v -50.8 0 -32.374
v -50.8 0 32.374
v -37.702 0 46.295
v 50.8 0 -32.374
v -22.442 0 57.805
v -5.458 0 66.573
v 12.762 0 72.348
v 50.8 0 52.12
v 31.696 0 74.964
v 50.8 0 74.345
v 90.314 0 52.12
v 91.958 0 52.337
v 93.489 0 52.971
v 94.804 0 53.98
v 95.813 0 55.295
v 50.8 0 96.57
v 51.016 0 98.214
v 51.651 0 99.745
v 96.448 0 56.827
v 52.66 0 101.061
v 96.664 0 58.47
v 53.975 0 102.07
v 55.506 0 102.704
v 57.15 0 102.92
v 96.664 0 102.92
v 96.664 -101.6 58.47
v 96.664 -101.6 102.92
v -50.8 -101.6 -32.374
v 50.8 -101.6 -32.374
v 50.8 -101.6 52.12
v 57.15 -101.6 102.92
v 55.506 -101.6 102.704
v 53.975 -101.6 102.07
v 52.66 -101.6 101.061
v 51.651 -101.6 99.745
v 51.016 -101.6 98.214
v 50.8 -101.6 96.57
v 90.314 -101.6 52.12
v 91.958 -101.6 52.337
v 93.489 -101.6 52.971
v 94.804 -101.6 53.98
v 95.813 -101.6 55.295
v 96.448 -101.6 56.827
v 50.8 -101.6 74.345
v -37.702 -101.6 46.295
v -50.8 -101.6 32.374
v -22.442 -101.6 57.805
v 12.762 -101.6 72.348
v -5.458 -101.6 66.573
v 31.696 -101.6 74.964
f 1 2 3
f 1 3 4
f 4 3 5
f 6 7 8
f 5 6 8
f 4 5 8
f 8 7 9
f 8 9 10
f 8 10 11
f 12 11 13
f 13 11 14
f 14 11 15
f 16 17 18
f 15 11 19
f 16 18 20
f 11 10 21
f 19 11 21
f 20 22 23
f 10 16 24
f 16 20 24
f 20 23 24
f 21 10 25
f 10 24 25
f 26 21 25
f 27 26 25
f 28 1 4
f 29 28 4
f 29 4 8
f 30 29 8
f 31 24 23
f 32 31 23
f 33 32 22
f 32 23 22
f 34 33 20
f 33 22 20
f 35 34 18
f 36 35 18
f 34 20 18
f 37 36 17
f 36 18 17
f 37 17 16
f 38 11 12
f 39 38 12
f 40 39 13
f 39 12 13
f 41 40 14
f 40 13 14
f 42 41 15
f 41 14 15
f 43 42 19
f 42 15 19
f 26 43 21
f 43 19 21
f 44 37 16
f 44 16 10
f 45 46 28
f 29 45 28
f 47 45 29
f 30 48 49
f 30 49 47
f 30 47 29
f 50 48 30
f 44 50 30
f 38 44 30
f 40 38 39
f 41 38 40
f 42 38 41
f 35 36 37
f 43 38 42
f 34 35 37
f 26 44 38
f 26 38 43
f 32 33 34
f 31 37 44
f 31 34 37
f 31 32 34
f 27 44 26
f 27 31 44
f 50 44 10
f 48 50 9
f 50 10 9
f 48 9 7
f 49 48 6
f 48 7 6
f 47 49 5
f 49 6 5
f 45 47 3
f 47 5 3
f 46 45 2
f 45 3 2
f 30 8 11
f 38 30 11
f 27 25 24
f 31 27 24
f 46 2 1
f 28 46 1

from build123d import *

# Parameters (mm, degrees)
F1_DEPTH = 101.6


with BuildPart() as f1:
    # F0 (on Front) → F1 (new body)
    with BuildSketch(Plane.XZ):
        Polygon((-50.8, -32.374417), (50.8, -32.374417), (50.8, 32.374417), (14.084613, 32.374417), (-50.8, 32.374417), align=None)
        with BuildLine():
            Line((14.084613, 32.374417), (50.8, 32.374417))
            Line((50.8, 32.374417), (50.8, 52.120494))
            Line((50.8, 52.120494), (50.8, 74.345494))
            ThreePointArc((50.8, 74.345494), (24.954765, 64.252521), (14.084613, 38.724417))
            Line((14.084613, 38.724417), (14.084613, 32.374417))
        make_face()
        with BuildLine():
            ThreePointArc((50.8, 74.345494), (-5.45833, 66.573015), (-50.8, 32.374417))
            Line((-50.8, 32.374417), (14.084613, 32.374417))
            Line((14.084613, 32.374417), (14.084613, 38.724417))
            ThreePointArc((14.084613, 38.724417), (24.954765, 64.252521), (50.8, 74.345494))
        make_face()
        with BuildLine():
            Line((50.8, 74.345494), (50.8, 52.120494))
            Line((50.8, 52.120494), (90.314029, 52.120494))
            ThreePointArc((90.314029, 52.120494), (94.804157, 53.980366), (96.664029, 58.470494))
            Line((96.664029, 58.470494), (96.664029, 102.920494))
            Line((96.664029, 102.920494), (57.15, 102.920494))
            ThreePointArc((57.15, 102.920494), (52.659872, 101.060622), (50.8, 96.570494))
            Line((50.8, 96.570494), (50.8, 74.345494))
        make_face()
    extrude(amount=F1_DEPTH)


solid = f1.part
